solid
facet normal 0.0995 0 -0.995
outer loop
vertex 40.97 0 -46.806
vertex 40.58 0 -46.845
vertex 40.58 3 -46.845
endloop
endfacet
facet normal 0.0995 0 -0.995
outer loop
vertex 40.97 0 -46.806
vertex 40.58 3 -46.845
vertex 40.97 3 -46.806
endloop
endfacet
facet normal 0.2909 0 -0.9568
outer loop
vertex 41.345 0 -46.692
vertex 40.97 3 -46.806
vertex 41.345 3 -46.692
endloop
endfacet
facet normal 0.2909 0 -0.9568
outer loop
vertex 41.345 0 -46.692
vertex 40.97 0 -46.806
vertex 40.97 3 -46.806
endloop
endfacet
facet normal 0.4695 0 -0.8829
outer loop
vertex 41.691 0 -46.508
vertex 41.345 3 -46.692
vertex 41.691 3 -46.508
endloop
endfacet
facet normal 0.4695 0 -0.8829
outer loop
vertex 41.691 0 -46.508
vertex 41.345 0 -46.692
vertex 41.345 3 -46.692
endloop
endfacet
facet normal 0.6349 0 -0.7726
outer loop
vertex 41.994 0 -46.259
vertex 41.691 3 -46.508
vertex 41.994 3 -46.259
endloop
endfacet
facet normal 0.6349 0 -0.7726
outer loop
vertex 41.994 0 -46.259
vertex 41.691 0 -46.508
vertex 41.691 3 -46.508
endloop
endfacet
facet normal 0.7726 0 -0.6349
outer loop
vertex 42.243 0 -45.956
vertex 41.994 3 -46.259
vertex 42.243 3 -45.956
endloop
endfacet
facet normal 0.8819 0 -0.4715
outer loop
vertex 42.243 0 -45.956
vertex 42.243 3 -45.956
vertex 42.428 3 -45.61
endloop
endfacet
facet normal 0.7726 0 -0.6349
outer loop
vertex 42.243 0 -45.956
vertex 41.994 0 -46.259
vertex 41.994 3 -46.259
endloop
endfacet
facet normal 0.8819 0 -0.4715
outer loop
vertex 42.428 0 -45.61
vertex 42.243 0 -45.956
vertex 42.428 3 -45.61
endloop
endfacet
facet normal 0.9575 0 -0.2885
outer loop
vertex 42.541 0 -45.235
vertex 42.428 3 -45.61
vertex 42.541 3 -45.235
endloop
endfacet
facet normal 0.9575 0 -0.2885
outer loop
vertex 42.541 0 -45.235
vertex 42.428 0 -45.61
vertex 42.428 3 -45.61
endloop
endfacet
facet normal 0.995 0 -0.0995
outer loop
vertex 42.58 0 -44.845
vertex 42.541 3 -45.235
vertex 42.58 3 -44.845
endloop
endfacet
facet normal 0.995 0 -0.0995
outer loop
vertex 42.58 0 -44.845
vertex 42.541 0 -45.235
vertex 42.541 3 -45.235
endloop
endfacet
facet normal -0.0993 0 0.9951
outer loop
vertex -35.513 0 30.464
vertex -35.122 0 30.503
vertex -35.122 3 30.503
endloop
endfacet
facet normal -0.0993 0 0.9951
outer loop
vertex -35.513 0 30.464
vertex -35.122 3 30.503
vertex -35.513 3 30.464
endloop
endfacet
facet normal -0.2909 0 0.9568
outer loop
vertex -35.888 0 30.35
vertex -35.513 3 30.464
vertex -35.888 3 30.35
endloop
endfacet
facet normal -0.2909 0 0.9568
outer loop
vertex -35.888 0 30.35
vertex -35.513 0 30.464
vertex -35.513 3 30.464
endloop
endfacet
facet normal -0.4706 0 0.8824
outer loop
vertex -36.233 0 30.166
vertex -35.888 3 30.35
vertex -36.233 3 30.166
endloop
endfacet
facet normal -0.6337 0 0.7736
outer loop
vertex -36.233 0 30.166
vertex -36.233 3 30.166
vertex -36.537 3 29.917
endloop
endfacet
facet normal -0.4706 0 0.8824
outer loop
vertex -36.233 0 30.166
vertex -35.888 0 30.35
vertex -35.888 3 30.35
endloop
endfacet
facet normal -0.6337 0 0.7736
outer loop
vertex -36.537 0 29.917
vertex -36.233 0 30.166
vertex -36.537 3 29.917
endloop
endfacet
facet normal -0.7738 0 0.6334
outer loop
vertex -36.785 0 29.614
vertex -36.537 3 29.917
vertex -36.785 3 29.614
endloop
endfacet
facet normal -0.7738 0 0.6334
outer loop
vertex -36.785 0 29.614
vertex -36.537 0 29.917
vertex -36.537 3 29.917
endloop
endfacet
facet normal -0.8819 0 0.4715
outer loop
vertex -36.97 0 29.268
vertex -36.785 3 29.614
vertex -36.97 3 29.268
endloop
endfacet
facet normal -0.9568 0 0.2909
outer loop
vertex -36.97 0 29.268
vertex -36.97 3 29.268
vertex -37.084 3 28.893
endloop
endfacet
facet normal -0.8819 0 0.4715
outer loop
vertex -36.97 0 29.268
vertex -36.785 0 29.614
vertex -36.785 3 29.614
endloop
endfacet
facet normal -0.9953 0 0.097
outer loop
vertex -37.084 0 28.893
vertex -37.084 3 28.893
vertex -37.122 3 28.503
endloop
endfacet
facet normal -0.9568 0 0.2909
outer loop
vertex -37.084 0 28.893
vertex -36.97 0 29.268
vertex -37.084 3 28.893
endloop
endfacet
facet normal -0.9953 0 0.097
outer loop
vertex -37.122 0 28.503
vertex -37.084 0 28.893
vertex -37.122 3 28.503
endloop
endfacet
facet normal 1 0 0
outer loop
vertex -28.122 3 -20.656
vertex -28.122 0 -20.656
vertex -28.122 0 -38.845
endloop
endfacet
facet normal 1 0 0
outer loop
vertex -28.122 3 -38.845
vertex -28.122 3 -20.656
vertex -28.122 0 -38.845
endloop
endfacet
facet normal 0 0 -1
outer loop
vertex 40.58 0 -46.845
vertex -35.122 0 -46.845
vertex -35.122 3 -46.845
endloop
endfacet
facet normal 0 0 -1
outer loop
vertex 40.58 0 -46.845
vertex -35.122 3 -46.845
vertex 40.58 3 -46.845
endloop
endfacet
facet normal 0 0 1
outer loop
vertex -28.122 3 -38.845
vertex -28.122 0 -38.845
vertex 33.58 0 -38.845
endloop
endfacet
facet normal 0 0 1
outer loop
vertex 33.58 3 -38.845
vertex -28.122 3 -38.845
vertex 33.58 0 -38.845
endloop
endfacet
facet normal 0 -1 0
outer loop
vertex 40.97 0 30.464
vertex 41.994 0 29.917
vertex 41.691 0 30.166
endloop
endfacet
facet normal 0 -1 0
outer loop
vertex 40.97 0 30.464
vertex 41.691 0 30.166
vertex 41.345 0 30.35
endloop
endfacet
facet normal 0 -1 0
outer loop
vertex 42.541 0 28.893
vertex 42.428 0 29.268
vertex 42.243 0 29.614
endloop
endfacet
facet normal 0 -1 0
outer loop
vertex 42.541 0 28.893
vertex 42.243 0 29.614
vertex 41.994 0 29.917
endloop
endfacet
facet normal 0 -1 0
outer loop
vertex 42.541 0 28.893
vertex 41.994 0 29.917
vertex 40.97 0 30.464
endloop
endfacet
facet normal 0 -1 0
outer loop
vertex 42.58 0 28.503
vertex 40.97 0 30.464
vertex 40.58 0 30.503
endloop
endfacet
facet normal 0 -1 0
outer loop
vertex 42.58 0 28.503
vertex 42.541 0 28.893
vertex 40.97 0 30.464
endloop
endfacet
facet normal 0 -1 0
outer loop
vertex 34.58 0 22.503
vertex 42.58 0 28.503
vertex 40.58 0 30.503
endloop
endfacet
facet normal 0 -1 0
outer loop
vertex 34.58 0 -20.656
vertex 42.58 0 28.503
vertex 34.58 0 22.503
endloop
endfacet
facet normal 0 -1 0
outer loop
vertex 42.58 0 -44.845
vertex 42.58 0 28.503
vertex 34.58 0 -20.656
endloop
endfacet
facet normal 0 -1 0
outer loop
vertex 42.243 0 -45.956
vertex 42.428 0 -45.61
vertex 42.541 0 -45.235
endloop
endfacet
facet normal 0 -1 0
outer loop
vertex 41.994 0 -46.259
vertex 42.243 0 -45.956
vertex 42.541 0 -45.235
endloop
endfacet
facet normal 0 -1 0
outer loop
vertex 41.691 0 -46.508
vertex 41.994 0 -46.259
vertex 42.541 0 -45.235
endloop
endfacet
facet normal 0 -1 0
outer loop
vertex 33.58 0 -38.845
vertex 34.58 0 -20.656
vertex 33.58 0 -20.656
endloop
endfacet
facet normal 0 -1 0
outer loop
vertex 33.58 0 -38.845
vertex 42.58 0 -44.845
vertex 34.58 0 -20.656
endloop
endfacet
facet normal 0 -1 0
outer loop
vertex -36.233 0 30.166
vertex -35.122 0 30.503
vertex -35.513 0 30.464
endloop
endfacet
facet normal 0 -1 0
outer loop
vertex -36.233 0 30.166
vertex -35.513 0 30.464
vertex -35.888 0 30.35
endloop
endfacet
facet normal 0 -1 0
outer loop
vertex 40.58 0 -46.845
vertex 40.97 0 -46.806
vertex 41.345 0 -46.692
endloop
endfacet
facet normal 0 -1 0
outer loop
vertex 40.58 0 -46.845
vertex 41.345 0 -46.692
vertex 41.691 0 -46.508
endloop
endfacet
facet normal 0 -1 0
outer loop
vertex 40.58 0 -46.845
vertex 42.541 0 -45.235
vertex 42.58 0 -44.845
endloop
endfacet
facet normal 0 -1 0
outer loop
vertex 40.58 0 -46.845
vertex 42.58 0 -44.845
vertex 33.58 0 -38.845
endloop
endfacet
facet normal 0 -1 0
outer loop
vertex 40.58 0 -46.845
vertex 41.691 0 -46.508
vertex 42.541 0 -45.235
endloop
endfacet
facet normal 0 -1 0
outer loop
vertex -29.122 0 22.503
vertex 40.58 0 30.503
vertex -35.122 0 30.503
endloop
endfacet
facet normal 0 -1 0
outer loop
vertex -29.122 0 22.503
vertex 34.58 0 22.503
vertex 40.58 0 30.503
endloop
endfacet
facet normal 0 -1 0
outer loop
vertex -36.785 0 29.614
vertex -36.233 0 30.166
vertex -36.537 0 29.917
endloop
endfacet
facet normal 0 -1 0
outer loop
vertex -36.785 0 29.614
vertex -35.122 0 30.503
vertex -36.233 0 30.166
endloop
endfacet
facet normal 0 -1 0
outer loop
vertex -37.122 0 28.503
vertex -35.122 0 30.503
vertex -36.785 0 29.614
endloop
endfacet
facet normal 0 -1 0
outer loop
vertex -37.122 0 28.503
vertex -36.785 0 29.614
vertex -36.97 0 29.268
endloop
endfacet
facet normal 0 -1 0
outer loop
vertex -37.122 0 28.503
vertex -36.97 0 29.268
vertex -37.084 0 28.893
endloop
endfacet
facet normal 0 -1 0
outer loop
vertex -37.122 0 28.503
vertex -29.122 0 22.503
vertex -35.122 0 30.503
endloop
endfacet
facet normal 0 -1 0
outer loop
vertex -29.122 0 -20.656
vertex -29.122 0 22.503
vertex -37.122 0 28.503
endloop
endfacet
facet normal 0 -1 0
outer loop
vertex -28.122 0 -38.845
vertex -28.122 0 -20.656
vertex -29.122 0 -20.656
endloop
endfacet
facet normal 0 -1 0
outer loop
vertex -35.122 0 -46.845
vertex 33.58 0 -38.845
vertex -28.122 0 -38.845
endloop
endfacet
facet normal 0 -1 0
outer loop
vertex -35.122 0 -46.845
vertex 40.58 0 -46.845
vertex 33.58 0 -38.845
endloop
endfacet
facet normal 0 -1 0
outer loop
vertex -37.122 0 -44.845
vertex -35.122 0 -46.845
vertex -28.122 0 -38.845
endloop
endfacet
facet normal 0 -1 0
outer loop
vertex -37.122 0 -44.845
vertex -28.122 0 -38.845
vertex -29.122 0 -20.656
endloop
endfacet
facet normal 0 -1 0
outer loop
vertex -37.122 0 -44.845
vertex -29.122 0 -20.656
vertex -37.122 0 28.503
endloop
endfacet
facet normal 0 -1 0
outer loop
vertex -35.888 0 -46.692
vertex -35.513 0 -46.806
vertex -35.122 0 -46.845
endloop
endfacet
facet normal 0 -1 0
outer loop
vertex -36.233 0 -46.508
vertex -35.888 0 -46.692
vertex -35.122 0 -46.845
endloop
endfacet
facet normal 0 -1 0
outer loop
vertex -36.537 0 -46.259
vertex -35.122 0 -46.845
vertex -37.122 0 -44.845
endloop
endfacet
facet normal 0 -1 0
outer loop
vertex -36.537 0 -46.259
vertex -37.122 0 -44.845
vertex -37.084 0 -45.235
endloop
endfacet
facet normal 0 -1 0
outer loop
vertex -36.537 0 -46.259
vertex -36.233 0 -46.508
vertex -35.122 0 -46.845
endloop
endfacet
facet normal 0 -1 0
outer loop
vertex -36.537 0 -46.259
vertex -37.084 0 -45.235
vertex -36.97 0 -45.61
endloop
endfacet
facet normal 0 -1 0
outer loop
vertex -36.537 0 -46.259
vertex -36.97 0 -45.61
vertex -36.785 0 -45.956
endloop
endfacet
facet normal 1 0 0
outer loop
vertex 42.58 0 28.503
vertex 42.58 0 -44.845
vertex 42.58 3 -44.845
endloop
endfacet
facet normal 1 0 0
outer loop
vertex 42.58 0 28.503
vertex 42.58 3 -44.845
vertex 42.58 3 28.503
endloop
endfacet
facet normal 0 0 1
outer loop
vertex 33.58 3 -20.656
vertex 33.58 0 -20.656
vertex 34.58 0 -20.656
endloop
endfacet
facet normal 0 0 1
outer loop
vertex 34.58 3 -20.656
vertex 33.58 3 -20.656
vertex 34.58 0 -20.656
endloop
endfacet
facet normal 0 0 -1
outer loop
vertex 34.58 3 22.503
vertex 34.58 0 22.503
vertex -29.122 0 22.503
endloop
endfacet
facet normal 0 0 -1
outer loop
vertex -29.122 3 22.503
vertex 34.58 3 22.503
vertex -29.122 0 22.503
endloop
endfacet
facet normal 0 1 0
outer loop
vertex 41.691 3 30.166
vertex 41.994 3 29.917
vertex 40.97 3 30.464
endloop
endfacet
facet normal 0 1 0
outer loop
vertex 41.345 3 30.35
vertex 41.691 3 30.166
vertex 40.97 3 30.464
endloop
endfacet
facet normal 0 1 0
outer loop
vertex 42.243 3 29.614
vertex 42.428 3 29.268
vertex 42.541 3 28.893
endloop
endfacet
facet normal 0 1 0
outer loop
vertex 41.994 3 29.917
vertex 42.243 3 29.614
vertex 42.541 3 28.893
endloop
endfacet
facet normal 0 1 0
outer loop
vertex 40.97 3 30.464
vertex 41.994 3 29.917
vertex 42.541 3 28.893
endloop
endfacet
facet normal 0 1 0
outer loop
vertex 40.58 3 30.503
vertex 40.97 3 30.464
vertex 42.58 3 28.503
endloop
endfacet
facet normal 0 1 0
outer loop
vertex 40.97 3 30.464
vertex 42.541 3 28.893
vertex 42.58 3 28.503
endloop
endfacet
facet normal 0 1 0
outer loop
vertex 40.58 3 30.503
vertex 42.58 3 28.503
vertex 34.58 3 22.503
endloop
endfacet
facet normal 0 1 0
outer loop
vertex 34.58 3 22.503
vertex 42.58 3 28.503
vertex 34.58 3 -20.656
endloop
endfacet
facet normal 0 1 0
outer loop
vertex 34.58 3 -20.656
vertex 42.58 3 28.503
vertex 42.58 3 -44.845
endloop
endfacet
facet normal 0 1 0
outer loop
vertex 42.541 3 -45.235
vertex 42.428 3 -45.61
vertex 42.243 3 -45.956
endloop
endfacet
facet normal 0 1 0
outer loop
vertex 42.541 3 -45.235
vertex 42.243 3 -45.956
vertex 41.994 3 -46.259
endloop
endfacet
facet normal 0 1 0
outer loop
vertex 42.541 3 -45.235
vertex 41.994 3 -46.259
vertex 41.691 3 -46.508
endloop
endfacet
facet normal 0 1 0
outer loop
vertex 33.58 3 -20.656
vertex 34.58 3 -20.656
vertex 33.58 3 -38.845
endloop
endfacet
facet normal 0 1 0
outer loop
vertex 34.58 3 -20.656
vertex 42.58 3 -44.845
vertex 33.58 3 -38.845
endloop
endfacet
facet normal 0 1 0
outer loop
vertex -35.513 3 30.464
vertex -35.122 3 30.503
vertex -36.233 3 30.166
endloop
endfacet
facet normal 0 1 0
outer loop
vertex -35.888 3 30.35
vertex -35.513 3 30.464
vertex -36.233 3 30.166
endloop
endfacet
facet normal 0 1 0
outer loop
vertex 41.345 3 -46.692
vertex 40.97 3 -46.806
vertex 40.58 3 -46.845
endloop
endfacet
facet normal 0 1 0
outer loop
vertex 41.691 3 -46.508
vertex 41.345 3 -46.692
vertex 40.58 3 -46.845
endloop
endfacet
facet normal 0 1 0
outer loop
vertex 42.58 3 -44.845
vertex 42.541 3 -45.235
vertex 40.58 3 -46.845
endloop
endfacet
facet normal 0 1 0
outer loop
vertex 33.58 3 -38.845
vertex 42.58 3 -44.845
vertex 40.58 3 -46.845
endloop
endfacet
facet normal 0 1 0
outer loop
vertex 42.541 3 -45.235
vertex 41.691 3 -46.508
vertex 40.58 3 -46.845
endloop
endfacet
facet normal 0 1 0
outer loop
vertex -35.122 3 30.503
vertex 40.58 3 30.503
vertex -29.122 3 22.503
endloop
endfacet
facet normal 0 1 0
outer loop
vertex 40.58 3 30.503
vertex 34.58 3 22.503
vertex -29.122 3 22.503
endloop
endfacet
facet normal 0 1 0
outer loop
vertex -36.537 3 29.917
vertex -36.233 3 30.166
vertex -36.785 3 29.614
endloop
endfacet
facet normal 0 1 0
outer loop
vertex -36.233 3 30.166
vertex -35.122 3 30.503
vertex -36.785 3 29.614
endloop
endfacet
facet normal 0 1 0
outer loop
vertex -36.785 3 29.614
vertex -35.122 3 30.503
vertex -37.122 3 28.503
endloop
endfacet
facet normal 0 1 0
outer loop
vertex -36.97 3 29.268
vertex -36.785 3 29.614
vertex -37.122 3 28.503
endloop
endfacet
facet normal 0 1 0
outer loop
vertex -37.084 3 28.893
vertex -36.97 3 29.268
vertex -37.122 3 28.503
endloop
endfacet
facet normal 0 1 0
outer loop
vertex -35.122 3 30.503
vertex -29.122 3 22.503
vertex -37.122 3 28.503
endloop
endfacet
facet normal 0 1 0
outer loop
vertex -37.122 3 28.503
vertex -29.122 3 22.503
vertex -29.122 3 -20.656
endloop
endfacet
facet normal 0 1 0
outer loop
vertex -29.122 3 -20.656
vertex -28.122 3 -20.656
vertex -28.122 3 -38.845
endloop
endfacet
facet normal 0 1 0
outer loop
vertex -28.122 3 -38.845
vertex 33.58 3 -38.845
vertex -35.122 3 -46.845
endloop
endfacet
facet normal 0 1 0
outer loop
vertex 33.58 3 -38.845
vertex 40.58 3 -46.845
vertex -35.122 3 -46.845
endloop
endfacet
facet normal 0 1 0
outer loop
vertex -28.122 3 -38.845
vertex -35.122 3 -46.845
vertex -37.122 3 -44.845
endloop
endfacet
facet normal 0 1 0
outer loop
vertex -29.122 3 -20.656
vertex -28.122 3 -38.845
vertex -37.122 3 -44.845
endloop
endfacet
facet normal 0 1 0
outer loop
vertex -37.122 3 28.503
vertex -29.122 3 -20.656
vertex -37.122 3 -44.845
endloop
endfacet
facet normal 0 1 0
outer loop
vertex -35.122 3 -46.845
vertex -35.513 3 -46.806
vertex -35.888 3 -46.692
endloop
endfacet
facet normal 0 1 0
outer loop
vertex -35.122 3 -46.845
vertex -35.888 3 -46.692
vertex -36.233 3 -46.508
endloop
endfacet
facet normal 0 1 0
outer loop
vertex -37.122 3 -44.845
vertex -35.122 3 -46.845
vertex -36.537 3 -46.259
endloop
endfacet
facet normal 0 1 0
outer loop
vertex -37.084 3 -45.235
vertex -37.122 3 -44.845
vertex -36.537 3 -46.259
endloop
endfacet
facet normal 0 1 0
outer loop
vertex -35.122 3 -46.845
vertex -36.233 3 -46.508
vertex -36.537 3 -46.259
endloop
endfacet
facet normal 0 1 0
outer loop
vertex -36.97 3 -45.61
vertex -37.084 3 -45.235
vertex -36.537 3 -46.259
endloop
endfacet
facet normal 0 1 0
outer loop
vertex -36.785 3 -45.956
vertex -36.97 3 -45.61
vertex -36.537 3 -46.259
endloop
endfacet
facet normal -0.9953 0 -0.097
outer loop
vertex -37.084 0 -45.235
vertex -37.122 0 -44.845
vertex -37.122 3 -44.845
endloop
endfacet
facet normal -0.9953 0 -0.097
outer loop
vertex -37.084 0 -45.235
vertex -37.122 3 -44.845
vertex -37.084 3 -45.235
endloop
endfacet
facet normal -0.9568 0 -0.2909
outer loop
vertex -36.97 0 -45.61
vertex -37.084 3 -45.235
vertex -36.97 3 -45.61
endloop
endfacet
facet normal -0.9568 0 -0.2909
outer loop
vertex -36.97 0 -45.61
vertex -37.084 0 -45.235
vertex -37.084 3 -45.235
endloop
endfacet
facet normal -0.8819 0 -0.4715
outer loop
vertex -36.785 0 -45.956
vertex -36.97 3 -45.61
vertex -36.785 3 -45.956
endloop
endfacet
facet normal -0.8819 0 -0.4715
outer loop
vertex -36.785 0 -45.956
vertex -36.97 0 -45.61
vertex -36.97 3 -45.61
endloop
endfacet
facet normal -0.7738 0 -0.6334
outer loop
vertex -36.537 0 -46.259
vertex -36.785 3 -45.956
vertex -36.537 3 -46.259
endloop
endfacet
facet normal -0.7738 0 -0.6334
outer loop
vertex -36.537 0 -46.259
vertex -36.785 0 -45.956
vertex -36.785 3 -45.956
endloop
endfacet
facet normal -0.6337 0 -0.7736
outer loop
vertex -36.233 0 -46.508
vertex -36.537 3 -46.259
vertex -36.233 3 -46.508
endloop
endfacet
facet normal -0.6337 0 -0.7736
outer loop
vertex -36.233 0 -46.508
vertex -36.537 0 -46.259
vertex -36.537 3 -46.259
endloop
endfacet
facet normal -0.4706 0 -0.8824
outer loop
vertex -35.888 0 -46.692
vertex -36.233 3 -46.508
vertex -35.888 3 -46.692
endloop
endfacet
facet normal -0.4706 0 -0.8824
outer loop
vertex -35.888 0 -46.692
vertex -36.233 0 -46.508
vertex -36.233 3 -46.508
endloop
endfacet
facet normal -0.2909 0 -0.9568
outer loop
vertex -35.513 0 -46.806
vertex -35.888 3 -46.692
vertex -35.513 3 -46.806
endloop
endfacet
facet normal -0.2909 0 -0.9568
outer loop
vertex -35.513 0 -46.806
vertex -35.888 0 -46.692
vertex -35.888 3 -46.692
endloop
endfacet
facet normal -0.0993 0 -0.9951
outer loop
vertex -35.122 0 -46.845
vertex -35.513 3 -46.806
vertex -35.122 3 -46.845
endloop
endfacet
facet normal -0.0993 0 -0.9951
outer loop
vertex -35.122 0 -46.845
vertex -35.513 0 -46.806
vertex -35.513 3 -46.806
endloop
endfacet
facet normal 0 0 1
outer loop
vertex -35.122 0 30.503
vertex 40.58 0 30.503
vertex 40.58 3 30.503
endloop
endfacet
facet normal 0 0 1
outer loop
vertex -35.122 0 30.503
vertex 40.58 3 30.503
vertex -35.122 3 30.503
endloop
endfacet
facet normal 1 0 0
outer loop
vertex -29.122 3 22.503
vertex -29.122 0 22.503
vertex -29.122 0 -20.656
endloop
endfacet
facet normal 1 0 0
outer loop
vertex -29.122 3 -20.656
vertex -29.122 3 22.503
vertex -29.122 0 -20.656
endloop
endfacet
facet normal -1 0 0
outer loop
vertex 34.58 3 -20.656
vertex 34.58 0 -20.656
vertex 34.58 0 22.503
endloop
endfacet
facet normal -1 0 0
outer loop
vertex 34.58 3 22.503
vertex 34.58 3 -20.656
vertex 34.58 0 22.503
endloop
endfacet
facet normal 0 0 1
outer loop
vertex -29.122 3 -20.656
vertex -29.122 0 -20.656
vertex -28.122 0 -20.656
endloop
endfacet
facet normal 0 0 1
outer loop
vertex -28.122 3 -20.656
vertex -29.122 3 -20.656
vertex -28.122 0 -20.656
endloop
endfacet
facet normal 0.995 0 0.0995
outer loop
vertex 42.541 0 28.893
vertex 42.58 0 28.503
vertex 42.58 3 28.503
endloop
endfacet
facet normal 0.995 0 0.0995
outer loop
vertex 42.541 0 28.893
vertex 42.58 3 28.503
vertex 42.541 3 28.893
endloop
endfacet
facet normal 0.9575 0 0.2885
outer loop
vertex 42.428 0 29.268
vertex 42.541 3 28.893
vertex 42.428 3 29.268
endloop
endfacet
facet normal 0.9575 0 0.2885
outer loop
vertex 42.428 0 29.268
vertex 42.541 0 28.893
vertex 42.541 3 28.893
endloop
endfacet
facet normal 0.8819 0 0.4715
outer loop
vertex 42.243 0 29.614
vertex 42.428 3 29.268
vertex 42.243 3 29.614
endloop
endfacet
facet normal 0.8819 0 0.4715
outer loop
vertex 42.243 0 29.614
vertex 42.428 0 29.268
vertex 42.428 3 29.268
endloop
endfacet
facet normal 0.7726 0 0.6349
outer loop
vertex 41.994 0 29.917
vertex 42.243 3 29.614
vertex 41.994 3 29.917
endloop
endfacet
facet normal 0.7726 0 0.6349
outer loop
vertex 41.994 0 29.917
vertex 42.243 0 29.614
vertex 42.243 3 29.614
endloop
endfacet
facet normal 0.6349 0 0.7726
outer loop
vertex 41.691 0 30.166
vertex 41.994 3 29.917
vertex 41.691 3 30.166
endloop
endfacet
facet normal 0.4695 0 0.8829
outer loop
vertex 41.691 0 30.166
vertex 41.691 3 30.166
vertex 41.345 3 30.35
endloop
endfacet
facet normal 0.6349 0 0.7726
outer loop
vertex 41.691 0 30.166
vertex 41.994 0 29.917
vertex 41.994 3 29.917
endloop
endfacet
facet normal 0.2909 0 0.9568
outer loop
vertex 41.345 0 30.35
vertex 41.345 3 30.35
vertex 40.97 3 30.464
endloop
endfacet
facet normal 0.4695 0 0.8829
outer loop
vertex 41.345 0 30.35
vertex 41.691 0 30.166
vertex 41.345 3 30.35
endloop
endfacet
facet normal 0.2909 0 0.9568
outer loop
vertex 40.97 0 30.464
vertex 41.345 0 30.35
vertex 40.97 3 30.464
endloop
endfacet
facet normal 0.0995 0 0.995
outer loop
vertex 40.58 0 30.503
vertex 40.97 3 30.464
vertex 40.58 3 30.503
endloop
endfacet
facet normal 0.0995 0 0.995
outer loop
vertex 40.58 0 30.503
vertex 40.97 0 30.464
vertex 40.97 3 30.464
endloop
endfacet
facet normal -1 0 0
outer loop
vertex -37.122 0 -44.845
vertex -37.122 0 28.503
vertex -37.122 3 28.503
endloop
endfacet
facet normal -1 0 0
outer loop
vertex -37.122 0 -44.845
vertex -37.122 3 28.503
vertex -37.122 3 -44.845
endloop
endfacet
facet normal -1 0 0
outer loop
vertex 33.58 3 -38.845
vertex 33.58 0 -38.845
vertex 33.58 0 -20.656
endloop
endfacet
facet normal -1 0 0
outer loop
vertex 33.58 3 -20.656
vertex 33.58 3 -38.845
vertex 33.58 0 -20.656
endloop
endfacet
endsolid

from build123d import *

# Parameters (mm, degrees)
EXTRUDE_1_DEPTH = 3


with BuildPart() as part:
    # 草图1 → 凸台-拉伸1 (new body)
    with BuildSketch(Plane(origin=(0, 0, 0), x_dir=(1, 0, 0), z_dir=(0, 1, 0))):
        with BuildLine():
            Line((-35.122340396, 46.844577244), (40.579802215, 46.844577244))
            ThreePointArc((40.579802215, 46.844577244), (41.994015777, 46.258790806), (42.579802215, 44.844577244))
            Line((42.579802215, 44.844577244), (42.579802215, -28.502662655))
            ThreePointArc((42.579802215, -28.502662655), (41.994015777, -29.916876218), (40.579802215, -30.502662655))
            Line((40.579802215, -30.502662655), (-35.122340396, -30.502662655))
            ThreePointArc((-35.122340396, -30.502662655), (-36.536553959, -29.916876218), (-37.122340396, -28.502662655))
            Line((-37.122340396, -28.502662655), (-37.122340396, 44.844577244))
            ThreePointArc((-37.122340396, 44.844577244), (-36.536553959, 46.258790806), (-35.122340396, 46.844577244))
        make_face()
        Polygon((-28.122340396, 20.655786491), (-28.122340396, 38.844577244), (33.579802215, 38.844577244), (33.579802215, 20.655786491), (34.579802215, 20.655786491), (34.579802215, -22.502662655), (-29.122340396, -22.502662655), (-29.122340396, 20.655786491), align=None, mode=Mode.SUBTRACT)
    extrude(amount=EXTRUDE_1_DEPTH)


solid = part.part
